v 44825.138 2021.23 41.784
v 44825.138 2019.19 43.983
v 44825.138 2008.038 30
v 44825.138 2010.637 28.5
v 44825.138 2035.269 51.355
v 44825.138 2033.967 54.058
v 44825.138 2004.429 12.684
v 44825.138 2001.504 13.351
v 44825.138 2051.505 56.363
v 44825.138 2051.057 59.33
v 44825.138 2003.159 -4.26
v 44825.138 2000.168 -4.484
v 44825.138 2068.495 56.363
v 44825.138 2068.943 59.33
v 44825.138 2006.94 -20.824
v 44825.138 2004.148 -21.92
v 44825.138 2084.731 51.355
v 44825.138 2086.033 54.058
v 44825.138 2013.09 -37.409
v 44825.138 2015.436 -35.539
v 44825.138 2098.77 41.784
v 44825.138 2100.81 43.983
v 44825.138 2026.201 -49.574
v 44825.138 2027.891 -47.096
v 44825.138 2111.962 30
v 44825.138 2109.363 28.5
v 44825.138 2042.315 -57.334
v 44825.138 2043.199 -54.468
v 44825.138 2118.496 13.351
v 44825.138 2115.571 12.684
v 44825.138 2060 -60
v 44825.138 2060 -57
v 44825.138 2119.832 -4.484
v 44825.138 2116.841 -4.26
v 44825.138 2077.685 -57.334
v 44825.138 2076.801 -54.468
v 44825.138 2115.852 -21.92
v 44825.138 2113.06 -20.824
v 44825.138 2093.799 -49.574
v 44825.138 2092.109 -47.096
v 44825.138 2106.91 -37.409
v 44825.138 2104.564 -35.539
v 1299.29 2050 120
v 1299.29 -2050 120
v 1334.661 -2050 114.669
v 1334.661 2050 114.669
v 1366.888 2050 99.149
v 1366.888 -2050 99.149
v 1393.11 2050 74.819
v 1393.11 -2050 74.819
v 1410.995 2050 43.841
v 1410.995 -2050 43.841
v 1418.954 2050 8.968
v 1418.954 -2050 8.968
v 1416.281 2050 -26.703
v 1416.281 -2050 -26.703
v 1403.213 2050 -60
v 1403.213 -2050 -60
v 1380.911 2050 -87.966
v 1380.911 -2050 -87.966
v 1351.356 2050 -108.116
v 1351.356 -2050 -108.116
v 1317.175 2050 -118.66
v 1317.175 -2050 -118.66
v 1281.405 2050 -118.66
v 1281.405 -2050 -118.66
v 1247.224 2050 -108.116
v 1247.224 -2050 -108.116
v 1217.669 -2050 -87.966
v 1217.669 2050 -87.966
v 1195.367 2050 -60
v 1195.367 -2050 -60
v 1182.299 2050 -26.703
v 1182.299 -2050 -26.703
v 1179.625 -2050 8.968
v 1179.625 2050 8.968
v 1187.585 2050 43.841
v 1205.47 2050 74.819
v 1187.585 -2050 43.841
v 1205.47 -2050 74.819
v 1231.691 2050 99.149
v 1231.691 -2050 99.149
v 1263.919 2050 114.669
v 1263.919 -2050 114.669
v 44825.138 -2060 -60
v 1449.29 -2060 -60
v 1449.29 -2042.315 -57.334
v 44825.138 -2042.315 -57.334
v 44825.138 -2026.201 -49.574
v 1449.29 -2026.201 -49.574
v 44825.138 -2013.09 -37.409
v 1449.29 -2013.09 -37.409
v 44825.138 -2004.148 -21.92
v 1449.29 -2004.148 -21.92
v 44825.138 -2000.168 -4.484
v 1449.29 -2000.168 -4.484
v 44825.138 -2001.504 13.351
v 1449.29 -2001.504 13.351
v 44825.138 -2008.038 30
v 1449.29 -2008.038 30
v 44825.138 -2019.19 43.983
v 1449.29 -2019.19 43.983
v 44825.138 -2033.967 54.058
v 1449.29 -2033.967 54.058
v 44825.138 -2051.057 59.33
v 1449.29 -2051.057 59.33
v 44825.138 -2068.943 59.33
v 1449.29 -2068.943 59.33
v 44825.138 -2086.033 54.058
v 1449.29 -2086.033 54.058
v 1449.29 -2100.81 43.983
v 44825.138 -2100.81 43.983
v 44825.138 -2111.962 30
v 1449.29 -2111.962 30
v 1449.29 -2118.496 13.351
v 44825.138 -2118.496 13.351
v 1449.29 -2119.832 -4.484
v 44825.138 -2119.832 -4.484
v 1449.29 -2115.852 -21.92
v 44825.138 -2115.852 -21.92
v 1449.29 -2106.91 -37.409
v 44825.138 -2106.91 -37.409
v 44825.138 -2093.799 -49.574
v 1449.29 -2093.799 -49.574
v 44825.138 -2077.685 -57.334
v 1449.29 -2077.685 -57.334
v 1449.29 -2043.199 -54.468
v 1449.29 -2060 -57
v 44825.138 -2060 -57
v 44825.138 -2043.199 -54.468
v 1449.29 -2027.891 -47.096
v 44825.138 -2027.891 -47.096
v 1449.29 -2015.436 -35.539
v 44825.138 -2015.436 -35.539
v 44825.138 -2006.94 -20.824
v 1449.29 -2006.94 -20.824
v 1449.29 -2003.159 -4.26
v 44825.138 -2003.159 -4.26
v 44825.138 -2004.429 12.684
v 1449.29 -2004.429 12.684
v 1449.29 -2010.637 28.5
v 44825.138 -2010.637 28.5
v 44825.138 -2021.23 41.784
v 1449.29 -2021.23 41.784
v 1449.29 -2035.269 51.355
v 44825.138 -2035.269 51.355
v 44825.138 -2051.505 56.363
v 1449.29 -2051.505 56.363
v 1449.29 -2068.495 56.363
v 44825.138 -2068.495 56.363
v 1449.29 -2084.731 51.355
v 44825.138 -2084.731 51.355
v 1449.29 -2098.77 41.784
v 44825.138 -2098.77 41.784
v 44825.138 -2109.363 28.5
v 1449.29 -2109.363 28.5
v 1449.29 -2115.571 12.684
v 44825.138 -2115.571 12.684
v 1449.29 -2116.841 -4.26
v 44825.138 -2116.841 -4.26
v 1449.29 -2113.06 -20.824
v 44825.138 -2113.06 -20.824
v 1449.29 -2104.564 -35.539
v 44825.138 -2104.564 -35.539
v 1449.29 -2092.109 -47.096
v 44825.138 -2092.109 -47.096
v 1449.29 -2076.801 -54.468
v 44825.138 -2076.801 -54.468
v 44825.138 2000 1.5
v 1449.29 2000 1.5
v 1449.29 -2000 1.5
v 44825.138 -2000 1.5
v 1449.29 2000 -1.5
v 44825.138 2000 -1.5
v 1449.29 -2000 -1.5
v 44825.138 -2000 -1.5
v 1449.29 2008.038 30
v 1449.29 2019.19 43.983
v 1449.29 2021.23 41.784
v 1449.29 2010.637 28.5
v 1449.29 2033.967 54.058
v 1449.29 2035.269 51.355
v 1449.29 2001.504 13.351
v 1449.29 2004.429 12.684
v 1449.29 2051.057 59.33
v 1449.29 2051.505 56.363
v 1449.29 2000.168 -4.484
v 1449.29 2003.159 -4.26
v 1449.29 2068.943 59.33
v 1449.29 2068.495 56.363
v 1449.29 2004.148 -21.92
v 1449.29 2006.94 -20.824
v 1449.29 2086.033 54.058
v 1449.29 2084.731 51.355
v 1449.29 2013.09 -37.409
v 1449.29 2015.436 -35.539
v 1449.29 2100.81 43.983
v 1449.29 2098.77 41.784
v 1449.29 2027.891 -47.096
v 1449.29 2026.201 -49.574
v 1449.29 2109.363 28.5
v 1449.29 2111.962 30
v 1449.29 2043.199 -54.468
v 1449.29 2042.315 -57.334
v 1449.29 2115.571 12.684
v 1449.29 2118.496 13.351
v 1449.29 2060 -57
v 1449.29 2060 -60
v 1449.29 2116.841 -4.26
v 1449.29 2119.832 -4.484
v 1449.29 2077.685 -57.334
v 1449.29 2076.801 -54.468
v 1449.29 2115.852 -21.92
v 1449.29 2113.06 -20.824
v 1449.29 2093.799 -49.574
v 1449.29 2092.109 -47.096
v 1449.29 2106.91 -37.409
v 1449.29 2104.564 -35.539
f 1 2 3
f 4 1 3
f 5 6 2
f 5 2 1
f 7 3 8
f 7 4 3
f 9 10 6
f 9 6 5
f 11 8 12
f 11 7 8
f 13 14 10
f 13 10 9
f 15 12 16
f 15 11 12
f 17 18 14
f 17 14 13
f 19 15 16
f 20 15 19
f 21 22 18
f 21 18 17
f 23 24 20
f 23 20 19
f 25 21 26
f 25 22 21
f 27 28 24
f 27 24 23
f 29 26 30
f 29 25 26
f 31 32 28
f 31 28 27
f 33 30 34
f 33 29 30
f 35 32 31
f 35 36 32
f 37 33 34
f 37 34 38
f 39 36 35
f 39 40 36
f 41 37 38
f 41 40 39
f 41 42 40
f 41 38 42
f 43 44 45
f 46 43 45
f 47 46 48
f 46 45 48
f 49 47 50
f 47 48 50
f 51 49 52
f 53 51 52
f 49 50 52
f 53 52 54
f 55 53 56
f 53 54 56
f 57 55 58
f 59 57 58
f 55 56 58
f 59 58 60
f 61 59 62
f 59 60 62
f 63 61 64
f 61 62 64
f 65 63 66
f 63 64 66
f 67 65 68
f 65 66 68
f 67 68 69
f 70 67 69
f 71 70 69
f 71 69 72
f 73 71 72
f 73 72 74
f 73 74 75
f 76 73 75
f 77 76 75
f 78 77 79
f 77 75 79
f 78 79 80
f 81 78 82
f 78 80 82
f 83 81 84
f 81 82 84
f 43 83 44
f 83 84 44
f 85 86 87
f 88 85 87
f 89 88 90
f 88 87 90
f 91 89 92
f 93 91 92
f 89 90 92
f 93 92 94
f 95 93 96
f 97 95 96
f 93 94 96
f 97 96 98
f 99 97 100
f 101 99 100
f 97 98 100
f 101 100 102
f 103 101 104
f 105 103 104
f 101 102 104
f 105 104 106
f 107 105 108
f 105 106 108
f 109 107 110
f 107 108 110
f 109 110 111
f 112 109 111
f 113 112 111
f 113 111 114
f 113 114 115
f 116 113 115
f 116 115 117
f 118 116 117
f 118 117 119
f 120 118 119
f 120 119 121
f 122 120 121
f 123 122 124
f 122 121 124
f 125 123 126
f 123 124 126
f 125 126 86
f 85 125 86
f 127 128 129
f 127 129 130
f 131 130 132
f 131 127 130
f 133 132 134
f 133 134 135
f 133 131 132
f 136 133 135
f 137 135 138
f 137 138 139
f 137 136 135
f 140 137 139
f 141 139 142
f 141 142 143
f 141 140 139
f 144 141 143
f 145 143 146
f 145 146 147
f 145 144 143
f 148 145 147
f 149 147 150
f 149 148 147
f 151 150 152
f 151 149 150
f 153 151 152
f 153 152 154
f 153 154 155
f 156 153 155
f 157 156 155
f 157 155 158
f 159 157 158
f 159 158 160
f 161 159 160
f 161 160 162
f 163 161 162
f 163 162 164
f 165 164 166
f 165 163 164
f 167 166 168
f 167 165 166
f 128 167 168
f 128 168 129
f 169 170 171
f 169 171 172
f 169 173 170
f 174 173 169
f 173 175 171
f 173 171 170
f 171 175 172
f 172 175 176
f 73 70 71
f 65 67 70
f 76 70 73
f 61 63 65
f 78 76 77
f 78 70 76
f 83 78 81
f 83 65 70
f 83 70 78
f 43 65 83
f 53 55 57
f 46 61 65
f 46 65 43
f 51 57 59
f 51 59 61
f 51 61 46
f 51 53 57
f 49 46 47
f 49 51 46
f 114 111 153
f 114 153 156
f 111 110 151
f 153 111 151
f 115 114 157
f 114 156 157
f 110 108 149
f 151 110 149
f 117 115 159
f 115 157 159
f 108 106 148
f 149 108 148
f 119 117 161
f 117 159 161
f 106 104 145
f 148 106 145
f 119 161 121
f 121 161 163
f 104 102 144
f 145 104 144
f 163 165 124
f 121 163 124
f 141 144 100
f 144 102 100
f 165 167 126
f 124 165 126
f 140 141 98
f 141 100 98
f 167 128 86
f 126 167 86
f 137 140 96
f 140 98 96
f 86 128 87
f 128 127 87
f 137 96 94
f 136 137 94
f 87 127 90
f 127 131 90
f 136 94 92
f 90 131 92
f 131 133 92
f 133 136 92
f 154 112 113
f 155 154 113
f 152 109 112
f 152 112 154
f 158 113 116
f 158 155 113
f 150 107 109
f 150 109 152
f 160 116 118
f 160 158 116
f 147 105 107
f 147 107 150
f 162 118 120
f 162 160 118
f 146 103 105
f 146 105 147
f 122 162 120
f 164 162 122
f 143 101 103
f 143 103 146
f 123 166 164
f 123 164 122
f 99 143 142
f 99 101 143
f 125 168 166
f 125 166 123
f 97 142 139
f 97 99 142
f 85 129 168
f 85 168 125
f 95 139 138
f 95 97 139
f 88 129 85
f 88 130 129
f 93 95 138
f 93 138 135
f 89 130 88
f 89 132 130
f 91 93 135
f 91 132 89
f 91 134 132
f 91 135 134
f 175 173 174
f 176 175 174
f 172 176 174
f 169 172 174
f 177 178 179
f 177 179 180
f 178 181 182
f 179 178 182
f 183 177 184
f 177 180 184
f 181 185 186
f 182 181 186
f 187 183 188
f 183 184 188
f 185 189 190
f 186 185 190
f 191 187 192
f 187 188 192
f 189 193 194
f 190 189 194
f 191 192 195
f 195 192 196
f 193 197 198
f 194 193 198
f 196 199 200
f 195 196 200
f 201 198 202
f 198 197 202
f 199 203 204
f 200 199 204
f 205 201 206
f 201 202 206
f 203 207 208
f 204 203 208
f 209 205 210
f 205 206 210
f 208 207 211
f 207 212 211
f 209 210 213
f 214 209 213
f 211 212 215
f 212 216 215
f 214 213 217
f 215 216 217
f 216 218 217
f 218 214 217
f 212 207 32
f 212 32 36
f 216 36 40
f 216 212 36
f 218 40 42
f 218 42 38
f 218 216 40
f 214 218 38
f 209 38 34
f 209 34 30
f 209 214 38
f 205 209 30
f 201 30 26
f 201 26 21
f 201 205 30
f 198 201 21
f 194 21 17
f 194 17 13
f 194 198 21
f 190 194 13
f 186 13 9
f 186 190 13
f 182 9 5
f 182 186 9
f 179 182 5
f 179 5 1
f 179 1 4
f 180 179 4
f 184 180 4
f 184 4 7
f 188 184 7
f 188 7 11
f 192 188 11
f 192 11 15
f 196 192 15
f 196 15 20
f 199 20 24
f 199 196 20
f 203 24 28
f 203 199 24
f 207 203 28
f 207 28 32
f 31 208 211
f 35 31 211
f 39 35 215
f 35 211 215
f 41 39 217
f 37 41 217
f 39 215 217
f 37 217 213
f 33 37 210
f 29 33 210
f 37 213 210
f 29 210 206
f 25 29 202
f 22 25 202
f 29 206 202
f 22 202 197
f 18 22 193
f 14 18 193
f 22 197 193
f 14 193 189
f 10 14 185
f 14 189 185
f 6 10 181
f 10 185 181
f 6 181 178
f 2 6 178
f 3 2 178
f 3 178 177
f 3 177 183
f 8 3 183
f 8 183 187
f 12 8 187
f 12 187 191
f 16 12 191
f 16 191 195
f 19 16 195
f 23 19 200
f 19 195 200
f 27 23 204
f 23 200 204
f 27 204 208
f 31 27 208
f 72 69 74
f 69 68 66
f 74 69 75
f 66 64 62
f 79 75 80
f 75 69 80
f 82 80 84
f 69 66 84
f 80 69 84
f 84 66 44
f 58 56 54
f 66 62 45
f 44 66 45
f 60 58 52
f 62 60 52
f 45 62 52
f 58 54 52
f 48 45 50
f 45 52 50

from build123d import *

# Parameters (mm, degrees)
BOSS_EXTRUDE1_START = -2050
SKETCH1_R           = 120
BOSS_EXTRUDE1_DEPTH = 4100
BOSS_EXTRUDE2_START = -1.5
SKETCH2_W           = 43375.848153551
SKETCH2_H           = 4000
BOSS_EXTRUDE2_DEPTH = 3
BOSS_EXTRUDE3_START = 1449.28989768
SKETCH3_R           = 60
SKETCH3_R_2         = 57
BOSS_EXTRUDE3_DEPTH = 43375.848153551
BOSS_EXTRUDE4_START = 1449.28989768
SKETCH4_R           = 60
SKETCH4_R_2         = 57
BOSS_EXTRUDE4_DEPTH = 43375.848153551


with BuildPart() as part:
    # Sketch1 → Boss-Extrude1 (new body)
    with BuildSketch(Plane(origin=(0, 0, 0), x_dir=(1, 0, 0), z_dir=(0, 1, 0)).offset(BOSS_EXTRUDE1_START)):
        with Locations(Location((1299.28989768, 0, 0), (0, 0, 270))):
            Circle(SKETCH1_R)
    extrude(amount=BOSS_EXTRUDE1_DEPTH)


with BuildPart() as body_2:
    # Sketch2 → Boss-Extrude2 (new body)
    with BuildSketch(Plane.XY.offset(BOSS_EXTRUDE2_START)):
        with Locations((23137.213974456, 0)):
            Rectangle(SKETCH2_W, SKETCH2_H)
    extrude(amount=BOSS_EXTRUDE2_DEPTH)


with BuildPart() as body_3:
    # Sketch3 → Boss-Extrude3 (new body)
    with BuildSketch(Plane(origin=(0, 0, 0), x_dir=(0, 0, -1), z_dir=(1, 0, 0)).offset(BOSS_EXTRUDE3_START)):
        with Locations((0, -2060)):
            Circle(SKETCH3_R)
        with Locations((0, -2060)):
            Circle(SKETCH3_R_2, mode=Mode.SUBTRACT)
    extrude(amount=BOSS_EXTRUDE3_DEPTH)


with BuildPart() as body_4:
    # Sketch4 → Boss-Extrude4 (new body)
    with BuildSketch(Plane(origin=(0, 0, 0), x_dir=(0, 0, -1), z_dir=(1, 0, 0)).offset(BOSS_EXTRUDE4_START)):
        with Locations((0, 2060)):
            Circle(SKETCH4_R)
        with Locations((0, 2060)):
            Circle(SKETCH4_R_2, mode=Mode.SUBTRACT)
    extrude(amount=BOSS_EXTRUDE4_DEPTH)


solid = Compound([part.part, body_2.part, body_3.part, body_4.part])
